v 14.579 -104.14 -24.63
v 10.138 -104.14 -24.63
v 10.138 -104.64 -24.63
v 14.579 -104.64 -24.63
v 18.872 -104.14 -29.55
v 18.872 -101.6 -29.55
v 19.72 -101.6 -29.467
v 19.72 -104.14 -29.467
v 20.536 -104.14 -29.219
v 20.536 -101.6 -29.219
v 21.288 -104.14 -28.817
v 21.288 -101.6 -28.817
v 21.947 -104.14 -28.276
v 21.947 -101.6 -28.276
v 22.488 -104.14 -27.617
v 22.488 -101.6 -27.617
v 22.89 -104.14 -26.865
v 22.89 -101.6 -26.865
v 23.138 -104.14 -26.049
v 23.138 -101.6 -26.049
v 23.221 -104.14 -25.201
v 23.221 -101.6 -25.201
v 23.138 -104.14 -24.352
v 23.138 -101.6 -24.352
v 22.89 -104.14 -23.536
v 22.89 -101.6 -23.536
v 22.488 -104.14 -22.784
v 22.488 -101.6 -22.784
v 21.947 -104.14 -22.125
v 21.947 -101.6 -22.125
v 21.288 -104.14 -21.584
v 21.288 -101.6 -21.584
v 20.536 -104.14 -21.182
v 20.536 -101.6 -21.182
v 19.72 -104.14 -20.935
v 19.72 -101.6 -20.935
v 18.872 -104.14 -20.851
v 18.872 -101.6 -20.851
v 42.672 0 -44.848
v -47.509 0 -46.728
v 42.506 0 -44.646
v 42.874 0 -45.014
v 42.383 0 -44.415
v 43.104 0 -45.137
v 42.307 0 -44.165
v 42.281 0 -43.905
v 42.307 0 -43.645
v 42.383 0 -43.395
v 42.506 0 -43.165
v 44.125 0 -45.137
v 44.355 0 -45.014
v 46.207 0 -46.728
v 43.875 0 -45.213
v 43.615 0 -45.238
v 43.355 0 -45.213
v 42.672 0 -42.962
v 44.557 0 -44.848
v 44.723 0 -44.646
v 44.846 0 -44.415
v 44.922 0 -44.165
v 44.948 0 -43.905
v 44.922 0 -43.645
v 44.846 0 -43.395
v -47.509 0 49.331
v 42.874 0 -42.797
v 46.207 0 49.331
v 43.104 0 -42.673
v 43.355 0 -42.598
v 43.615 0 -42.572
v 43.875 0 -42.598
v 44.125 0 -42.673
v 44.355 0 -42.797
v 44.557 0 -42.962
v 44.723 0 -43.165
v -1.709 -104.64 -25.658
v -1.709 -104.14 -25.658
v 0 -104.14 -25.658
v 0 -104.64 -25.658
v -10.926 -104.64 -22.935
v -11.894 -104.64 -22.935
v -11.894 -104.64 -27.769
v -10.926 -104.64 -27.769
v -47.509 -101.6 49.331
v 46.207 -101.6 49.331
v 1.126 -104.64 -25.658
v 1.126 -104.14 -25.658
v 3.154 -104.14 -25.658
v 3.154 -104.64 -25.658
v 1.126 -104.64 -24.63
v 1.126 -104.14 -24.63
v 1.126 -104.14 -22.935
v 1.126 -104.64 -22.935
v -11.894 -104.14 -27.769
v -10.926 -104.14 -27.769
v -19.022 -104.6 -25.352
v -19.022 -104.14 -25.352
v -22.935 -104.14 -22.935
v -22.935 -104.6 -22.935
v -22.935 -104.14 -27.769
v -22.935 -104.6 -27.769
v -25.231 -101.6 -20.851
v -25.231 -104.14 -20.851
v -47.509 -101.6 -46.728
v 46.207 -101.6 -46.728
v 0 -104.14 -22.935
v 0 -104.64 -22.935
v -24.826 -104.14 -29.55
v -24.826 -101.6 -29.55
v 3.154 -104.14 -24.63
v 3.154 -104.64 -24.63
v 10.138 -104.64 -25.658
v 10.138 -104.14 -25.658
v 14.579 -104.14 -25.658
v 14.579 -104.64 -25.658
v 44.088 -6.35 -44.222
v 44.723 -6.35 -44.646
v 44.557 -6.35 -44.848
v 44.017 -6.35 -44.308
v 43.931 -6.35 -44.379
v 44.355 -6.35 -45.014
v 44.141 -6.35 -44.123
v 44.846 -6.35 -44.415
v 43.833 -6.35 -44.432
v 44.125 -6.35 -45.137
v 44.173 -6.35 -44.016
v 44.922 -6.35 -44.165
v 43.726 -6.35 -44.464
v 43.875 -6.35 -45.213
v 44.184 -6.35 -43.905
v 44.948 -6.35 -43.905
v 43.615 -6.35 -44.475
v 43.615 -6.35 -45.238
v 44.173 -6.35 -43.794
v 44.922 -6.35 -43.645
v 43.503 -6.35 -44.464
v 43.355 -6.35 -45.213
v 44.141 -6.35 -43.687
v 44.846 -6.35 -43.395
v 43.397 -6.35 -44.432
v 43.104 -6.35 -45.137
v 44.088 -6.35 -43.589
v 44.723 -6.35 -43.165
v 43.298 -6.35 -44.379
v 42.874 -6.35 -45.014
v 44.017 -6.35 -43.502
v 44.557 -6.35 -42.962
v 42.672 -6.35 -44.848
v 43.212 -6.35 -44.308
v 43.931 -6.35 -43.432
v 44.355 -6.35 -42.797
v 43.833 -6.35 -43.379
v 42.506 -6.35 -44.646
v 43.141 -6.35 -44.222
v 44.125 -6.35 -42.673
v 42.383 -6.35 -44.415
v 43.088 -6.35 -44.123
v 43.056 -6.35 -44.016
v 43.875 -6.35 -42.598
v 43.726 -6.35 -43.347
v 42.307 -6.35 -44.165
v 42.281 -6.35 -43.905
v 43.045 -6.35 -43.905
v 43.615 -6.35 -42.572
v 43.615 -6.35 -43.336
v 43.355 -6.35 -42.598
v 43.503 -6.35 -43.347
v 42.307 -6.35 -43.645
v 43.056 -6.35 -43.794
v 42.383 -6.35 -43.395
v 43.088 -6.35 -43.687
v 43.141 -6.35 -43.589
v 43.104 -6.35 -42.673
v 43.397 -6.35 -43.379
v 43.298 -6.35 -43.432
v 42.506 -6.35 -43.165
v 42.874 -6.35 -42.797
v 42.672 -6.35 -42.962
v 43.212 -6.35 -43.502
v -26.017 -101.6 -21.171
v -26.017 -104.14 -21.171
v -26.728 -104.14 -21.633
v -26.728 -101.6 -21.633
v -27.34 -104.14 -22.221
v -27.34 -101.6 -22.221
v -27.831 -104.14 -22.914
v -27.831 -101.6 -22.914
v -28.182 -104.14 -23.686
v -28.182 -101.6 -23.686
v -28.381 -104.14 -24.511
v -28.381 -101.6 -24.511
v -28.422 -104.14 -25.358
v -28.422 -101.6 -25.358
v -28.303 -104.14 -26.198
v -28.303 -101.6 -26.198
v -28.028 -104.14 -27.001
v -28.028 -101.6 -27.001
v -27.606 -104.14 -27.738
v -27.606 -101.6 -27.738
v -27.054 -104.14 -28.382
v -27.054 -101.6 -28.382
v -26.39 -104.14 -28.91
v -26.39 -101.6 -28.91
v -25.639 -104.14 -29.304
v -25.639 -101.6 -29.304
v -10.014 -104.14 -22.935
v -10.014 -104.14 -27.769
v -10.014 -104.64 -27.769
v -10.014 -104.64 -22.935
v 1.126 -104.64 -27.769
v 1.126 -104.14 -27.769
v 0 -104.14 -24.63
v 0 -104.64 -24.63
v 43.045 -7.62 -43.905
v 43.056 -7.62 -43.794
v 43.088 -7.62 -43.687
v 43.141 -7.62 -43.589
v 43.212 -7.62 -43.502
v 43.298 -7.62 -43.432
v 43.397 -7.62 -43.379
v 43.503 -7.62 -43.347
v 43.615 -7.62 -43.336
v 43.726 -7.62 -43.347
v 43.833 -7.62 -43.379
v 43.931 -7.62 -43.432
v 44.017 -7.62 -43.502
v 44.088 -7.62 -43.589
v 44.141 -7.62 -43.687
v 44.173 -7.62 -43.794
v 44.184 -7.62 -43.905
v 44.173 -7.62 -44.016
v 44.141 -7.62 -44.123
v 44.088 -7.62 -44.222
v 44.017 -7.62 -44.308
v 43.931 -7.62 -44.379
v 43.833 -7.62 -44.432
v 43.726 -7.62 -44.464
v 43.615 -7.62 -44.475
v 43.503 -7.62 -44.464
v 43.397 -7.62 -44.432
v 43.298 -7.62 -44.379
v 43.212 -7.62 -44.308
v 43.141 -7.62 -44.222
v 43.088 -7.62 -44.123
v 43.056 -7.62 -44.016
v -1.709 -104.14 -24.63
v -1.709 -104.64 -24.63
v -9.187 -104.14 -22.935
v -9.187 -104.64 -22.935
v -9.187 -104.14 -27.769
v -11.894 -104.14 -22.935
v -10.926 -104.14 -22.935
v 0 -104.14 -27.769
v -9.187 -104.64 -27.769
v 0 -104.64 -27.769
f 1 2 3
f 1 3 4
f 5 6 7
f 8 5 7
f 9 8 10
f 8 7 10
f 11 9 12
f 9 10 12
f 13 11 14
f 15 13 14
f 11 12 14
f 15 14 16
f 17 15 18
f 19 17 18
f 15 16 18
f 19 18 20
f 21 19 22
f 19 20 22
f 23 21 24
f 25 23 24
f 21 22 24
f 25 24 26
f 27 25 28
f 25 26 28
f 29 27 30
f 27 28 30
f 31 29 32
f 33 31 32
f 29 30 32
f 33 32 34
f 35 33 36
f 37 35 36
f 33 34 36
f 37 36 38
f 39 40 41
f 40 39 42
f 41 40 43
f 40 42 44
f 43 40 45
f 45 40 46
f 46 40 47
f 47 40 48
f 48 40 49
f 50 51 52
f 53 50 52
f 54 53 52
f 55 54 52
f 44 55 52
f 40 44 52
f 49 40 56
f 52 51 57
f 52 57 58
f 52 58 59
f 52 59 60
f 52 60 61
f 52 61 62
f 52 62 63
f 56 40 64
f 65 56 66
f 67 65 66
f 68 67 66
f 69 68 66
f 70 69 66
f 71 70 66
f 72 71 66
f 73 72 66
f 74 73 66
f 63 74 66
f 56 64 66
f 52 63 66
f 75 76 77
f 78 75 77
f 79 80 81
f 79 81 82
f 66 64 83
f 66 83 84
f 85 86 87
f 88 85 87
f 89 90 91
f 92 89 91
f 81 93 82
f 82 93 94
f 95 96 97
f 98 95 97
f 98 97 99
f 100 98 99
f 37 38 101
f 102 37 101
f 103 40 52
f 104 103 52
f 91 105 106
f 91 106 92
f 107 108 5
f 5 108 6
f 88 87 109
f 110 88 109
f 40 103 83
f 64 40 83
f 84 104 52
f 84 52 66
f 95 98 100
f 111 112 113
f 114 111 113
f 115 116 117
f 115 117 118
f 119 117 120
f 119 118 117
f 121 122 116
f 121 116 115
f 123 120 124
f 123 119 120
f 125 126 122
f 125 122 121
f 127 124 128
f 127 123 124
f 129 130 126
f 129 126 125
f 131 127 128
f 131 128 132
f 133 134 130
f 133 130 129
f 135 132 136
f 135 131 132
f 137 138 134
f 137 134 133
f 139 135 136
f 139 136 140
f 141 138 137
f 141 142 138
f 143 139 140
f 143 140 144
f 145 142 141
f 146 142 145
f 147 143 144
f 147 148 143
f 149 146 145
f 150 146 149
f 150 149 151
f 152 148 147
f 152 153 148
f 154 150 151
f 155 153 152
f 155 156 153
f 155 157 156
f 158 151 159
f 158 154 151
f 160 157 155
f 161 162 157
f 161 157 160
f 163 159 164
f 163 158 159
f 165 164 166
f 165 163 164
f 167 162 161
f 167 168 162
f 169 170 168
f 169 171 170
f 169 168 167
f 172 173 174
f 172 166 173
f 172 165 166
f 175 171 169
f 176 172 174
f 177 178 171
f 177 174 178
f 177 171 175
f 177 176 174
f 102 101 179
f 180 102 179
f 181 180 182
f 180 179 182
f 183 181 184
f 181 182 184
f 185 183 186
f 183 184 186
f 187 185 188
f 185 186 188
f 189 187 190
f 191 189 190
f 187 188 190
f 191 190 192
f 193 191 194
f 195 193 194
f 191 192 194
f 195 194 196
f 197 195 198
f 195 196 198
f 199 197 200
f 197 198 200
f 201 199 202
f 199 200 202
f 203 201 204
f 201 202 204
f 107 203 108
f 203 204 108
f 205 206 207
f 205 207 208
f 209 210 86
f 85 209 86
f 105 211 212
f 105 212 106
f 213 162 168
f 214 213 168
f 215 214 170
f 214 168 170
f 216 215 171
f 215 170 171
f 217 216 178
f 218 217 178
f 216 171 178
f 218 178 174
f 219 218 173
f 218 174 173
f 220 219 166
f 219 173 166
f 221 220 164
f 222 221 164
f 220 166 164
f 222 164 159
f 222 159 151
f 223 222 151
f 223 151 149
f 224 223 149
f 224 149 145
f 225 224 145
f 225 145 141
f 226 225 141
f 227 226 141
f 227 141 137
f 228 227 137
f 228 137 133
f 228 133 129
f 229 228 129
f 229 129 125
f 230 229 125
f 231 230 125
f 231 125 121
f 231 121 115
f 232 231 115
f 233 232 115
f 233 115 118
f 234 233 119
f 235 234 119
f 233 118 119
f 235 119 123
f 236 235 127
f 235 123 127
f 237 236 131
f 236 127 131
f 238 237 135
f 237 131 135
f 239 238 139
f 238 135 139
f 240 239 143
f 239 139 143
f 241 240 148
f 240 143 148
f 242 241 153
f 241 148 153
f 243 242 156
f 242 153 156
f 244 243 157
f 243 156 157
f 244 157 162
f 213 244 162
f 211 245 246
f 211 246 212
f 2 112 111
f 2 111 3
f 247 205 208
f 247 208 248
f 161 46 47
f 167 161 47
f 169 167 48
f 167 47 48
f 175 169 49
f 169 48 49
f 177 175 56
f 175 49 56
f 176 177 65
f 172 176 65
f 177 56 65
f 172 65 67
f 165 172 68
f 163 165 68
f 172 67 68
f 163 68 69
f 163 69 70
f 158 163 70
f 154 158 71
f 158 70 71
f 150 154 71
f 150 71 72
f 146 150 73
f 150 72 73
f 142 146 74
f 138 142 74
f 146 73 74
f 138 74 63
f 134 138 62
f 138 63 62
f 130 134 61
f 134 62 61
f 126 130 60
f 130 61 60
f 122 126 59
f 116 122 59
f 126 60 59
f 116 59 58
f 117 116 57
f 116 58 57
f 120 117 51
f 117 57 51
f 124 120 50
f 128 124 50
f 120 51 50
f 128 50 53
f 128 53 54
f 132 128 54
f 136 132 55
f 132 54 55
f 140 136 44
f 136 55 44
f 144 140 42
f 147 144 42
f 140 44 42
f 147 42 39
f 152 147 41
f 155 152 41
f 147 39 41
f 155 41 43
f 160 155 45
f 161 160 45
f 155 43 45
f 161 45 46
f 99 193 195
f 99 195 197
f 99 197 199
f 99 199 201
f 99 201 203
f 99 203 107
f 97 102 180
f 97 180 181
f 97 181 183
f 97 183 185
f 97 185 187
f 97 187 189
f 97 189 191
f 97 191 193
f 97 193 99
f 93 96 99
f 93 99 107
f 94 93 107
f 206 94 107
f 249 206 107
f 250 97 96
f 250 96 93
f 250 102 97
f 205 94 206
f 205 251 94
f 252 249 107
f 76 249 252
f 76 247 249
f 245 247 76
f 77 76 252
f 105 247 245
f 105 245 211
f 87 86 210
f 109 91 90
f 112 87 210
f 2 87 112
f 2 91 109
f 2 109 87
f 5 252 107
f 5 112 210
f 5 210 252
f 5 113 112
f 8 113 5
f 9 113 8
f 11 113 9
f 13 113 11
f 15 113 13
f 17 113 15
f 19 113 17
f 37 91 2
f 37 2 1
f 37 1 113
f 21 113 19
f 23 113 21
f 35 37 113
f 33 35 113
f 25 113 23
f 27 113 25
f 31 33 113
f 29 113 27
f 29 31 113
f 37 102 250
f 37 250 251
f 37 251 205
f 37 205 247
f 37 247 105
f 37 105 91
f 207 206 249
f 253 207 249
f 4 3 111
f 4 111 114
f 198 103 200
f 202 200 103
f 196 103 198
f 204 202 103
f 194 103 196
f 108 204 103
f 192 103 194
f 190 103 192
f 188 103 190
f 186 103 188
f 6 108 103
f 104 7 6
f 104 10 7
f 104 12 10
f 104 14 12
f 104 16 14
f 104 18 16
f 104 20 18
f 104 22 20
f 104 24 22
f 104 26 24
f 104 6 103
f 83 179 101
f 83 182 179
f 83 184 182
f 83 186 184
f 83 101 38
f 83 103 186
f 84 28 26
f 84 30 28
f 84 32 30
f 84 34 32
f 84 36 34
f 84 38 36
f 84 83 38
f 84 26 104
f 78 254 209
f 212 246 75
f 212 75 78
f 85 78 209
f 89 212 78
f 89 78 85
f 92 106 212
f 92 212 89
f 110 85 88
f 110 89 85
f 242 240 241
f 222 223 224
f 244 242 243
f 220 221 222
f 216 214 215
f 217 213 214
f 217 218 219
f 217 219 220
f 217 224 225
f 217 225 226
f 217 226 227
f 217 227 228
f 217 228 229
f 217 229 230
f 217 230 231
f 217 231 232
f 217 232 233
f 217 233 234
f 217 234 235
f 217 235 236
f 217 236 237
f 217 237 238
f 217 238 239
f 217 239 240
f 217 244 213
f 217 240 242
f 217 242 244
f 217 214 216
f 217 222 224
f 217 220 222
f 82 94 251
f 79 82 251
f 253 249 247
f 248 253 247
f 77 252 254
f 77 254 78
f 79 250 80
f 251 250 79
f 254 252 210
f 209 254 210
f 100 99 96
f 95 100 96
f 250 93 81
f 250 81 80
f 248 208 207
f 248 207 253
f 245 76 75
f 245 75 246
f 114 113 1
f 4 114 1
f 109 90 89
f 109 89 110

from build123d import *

# Parameters (mm, degrees)
F0_W      = 93.715839088
F0_H      = 96.0587337613
F1_DEPTH  = 101.6
F2_W      = 8.2945693284
F2_H      = 8.6991842836
F2_W_2    = 8.0922637135
F2_W_3    = 8.2945674658
F2_W_4    = 7.8899562359
F3_DEPTH  = 2.54
F5_DEPTH  = 3
F6_W      = 0.9676124901
F6_H      = 4.834022373
F6_W_2    = 0.8269865066
F7_DEPTH  = 0.5
F8_W      = 1.12604897
F8_H      = 4.834022373
F9_DEPTH  = 0.5
F10_W     = 4.8627895303
F10_H     = 1.0272618383
F11_DEPTH = 0.5
F12_W     = 4.4415825978
F12_H     = 1.0272618383
F13_DEPTH = 0.5
F14_R     = 1.3332383726
F15_DEPTH = 6.35
F16_R     = 0.5696263833
F17_DEPTH = 7.62


with BuildPart() as f1:
    # F0 (on Front) → F1 (new body)
    with BuildSketch(Plane.XZ):
        with Locations((-0.6508044899, 1.3016089797)):
            Rectangle(F0_W, F0_H)
    extrude(amount=F1_DEPTH)

    # F2 (on face) → F3 (join)
    with BuildSketch(Plane.XZ.offset(101.6)):
        with BuildLine():
            Line((-19.5664688945, -20.8509583026), (-25.2310521901, -20.8509583026))
            ThreePointArc((-25.2310521901, -20.8509583026), (-28.4223170669, -25.358390925), (-24.8264390975, -29.5501425862))
            Line((-24.8264390975, -29.5501425862), (-19.5664688945, -29.5501425862))
            Line((-19.5664688945, -29.5501425862), (-19.5664688945, -20.8509583026))
        make_face()
        with Locations((-15.4191842303, -25.2005504444)):
            Rectangle(F2_W, F2_H)
        with Locations((-7.2257677093, -25.2005504444)):
            Rectangle(F2_W_2, F2_H)
        with Locations((0.9676478803, -25.2005504444)):
            Rectangle(F2_W_3, F2_H)
        with Locations((9.0599097311, -25.2005504444)):
            Rectangle(F2_W_4, F2_H)
        with BuildLine():
            Line((18.8717804849, -20.8509583026), (13.0048878491, -20.8509583026))
            Line((13.0048878491, -20.8509583026), (13.0048878491, -29.5501425862))
            Line((13.0048878491, -29.5501425862), (18.8717804849, -29.5501425862))
            ThreePointArc((18.8717804849, -29.5501425862), (23.2213726267, -25.2005504444), (18.8717804849, -20.8509583026))
        make_face()
    extrude(amount=F3_DEPTH)

    # F4 (on face) → F5 (join)
    with BuildSketch(Plane.XZ.offset(101.6)):
        Polygon((-19.0216936171, -25.3522377461), (-22.935193032, -22.9352265596), (-22.935193032, -27.7692489326), align=None)
    extrude(amount=F5_DEPTH)

    # F6 (on face) → F7 (join)
    with BuildSketch(Plane.XZ.offset(104.14)):
        with Locations((-11.4101376384, -25.3522377461)):
            Rectangle(F6_W, F6_H)
        with Locations((-9.6004614606, -25.3522377461)):
            Rectangle(F6_W_2, F6_H)
    extrude(amount=F7_DEPTH)

    # F8 (on face) → F9 (join)
    with BuildSketch(Plane.XZ.offset(104.14)):
        with Locations((0.563024485, -25.3522377461)):
            Rectangle(F8_W, F8_H)
    extrude(amount=F9_DEPTH)

    # F10 (on face) → F11 (join)
    with BuildSketch(Plane.XZ.offset(104.14)):
        with Locations((0.7227337919, -25.1438906416)):
            Rectangle(F10_W, F10_H)
    extrude(amount=F11_DEPTH)

    # F12 (on face) → F13 (join)
    with BuildSketch(Plane.XZ.offset(104.14)):
        with Locations((12.3583828099, -25.1438906416)):
            Rectangle(F12_W, F12_H)
    extrude(amount=F13_DEPTH)

    # F14 (on face) → F15 (cut)
    with BuildSketch(Plane(origin=(0, 0, 0), x_dir=(-1, 0, 0), z_dir=(0, 1, 0))):
        with Locations((-43.6146184802, -43.905235827)):
            Circle(F14_R)
    extrude(amount=-F15_DEPTH, mode=Mode.SUBTRACT)

    # F16 (on face) → F17 (cut)
    with BuildSketch(Plane(origin=(0, 0, 0), x_dir=(-1, 0, 0), z_dir=(0, 1, 0))):
        with Locations((-43.6146184802, -43.905235827)):
            Circle(F16_R)
    extrude(amount=-F17_DEPTH, mode=Mode.SUBTRACT)


solid = f1.part
